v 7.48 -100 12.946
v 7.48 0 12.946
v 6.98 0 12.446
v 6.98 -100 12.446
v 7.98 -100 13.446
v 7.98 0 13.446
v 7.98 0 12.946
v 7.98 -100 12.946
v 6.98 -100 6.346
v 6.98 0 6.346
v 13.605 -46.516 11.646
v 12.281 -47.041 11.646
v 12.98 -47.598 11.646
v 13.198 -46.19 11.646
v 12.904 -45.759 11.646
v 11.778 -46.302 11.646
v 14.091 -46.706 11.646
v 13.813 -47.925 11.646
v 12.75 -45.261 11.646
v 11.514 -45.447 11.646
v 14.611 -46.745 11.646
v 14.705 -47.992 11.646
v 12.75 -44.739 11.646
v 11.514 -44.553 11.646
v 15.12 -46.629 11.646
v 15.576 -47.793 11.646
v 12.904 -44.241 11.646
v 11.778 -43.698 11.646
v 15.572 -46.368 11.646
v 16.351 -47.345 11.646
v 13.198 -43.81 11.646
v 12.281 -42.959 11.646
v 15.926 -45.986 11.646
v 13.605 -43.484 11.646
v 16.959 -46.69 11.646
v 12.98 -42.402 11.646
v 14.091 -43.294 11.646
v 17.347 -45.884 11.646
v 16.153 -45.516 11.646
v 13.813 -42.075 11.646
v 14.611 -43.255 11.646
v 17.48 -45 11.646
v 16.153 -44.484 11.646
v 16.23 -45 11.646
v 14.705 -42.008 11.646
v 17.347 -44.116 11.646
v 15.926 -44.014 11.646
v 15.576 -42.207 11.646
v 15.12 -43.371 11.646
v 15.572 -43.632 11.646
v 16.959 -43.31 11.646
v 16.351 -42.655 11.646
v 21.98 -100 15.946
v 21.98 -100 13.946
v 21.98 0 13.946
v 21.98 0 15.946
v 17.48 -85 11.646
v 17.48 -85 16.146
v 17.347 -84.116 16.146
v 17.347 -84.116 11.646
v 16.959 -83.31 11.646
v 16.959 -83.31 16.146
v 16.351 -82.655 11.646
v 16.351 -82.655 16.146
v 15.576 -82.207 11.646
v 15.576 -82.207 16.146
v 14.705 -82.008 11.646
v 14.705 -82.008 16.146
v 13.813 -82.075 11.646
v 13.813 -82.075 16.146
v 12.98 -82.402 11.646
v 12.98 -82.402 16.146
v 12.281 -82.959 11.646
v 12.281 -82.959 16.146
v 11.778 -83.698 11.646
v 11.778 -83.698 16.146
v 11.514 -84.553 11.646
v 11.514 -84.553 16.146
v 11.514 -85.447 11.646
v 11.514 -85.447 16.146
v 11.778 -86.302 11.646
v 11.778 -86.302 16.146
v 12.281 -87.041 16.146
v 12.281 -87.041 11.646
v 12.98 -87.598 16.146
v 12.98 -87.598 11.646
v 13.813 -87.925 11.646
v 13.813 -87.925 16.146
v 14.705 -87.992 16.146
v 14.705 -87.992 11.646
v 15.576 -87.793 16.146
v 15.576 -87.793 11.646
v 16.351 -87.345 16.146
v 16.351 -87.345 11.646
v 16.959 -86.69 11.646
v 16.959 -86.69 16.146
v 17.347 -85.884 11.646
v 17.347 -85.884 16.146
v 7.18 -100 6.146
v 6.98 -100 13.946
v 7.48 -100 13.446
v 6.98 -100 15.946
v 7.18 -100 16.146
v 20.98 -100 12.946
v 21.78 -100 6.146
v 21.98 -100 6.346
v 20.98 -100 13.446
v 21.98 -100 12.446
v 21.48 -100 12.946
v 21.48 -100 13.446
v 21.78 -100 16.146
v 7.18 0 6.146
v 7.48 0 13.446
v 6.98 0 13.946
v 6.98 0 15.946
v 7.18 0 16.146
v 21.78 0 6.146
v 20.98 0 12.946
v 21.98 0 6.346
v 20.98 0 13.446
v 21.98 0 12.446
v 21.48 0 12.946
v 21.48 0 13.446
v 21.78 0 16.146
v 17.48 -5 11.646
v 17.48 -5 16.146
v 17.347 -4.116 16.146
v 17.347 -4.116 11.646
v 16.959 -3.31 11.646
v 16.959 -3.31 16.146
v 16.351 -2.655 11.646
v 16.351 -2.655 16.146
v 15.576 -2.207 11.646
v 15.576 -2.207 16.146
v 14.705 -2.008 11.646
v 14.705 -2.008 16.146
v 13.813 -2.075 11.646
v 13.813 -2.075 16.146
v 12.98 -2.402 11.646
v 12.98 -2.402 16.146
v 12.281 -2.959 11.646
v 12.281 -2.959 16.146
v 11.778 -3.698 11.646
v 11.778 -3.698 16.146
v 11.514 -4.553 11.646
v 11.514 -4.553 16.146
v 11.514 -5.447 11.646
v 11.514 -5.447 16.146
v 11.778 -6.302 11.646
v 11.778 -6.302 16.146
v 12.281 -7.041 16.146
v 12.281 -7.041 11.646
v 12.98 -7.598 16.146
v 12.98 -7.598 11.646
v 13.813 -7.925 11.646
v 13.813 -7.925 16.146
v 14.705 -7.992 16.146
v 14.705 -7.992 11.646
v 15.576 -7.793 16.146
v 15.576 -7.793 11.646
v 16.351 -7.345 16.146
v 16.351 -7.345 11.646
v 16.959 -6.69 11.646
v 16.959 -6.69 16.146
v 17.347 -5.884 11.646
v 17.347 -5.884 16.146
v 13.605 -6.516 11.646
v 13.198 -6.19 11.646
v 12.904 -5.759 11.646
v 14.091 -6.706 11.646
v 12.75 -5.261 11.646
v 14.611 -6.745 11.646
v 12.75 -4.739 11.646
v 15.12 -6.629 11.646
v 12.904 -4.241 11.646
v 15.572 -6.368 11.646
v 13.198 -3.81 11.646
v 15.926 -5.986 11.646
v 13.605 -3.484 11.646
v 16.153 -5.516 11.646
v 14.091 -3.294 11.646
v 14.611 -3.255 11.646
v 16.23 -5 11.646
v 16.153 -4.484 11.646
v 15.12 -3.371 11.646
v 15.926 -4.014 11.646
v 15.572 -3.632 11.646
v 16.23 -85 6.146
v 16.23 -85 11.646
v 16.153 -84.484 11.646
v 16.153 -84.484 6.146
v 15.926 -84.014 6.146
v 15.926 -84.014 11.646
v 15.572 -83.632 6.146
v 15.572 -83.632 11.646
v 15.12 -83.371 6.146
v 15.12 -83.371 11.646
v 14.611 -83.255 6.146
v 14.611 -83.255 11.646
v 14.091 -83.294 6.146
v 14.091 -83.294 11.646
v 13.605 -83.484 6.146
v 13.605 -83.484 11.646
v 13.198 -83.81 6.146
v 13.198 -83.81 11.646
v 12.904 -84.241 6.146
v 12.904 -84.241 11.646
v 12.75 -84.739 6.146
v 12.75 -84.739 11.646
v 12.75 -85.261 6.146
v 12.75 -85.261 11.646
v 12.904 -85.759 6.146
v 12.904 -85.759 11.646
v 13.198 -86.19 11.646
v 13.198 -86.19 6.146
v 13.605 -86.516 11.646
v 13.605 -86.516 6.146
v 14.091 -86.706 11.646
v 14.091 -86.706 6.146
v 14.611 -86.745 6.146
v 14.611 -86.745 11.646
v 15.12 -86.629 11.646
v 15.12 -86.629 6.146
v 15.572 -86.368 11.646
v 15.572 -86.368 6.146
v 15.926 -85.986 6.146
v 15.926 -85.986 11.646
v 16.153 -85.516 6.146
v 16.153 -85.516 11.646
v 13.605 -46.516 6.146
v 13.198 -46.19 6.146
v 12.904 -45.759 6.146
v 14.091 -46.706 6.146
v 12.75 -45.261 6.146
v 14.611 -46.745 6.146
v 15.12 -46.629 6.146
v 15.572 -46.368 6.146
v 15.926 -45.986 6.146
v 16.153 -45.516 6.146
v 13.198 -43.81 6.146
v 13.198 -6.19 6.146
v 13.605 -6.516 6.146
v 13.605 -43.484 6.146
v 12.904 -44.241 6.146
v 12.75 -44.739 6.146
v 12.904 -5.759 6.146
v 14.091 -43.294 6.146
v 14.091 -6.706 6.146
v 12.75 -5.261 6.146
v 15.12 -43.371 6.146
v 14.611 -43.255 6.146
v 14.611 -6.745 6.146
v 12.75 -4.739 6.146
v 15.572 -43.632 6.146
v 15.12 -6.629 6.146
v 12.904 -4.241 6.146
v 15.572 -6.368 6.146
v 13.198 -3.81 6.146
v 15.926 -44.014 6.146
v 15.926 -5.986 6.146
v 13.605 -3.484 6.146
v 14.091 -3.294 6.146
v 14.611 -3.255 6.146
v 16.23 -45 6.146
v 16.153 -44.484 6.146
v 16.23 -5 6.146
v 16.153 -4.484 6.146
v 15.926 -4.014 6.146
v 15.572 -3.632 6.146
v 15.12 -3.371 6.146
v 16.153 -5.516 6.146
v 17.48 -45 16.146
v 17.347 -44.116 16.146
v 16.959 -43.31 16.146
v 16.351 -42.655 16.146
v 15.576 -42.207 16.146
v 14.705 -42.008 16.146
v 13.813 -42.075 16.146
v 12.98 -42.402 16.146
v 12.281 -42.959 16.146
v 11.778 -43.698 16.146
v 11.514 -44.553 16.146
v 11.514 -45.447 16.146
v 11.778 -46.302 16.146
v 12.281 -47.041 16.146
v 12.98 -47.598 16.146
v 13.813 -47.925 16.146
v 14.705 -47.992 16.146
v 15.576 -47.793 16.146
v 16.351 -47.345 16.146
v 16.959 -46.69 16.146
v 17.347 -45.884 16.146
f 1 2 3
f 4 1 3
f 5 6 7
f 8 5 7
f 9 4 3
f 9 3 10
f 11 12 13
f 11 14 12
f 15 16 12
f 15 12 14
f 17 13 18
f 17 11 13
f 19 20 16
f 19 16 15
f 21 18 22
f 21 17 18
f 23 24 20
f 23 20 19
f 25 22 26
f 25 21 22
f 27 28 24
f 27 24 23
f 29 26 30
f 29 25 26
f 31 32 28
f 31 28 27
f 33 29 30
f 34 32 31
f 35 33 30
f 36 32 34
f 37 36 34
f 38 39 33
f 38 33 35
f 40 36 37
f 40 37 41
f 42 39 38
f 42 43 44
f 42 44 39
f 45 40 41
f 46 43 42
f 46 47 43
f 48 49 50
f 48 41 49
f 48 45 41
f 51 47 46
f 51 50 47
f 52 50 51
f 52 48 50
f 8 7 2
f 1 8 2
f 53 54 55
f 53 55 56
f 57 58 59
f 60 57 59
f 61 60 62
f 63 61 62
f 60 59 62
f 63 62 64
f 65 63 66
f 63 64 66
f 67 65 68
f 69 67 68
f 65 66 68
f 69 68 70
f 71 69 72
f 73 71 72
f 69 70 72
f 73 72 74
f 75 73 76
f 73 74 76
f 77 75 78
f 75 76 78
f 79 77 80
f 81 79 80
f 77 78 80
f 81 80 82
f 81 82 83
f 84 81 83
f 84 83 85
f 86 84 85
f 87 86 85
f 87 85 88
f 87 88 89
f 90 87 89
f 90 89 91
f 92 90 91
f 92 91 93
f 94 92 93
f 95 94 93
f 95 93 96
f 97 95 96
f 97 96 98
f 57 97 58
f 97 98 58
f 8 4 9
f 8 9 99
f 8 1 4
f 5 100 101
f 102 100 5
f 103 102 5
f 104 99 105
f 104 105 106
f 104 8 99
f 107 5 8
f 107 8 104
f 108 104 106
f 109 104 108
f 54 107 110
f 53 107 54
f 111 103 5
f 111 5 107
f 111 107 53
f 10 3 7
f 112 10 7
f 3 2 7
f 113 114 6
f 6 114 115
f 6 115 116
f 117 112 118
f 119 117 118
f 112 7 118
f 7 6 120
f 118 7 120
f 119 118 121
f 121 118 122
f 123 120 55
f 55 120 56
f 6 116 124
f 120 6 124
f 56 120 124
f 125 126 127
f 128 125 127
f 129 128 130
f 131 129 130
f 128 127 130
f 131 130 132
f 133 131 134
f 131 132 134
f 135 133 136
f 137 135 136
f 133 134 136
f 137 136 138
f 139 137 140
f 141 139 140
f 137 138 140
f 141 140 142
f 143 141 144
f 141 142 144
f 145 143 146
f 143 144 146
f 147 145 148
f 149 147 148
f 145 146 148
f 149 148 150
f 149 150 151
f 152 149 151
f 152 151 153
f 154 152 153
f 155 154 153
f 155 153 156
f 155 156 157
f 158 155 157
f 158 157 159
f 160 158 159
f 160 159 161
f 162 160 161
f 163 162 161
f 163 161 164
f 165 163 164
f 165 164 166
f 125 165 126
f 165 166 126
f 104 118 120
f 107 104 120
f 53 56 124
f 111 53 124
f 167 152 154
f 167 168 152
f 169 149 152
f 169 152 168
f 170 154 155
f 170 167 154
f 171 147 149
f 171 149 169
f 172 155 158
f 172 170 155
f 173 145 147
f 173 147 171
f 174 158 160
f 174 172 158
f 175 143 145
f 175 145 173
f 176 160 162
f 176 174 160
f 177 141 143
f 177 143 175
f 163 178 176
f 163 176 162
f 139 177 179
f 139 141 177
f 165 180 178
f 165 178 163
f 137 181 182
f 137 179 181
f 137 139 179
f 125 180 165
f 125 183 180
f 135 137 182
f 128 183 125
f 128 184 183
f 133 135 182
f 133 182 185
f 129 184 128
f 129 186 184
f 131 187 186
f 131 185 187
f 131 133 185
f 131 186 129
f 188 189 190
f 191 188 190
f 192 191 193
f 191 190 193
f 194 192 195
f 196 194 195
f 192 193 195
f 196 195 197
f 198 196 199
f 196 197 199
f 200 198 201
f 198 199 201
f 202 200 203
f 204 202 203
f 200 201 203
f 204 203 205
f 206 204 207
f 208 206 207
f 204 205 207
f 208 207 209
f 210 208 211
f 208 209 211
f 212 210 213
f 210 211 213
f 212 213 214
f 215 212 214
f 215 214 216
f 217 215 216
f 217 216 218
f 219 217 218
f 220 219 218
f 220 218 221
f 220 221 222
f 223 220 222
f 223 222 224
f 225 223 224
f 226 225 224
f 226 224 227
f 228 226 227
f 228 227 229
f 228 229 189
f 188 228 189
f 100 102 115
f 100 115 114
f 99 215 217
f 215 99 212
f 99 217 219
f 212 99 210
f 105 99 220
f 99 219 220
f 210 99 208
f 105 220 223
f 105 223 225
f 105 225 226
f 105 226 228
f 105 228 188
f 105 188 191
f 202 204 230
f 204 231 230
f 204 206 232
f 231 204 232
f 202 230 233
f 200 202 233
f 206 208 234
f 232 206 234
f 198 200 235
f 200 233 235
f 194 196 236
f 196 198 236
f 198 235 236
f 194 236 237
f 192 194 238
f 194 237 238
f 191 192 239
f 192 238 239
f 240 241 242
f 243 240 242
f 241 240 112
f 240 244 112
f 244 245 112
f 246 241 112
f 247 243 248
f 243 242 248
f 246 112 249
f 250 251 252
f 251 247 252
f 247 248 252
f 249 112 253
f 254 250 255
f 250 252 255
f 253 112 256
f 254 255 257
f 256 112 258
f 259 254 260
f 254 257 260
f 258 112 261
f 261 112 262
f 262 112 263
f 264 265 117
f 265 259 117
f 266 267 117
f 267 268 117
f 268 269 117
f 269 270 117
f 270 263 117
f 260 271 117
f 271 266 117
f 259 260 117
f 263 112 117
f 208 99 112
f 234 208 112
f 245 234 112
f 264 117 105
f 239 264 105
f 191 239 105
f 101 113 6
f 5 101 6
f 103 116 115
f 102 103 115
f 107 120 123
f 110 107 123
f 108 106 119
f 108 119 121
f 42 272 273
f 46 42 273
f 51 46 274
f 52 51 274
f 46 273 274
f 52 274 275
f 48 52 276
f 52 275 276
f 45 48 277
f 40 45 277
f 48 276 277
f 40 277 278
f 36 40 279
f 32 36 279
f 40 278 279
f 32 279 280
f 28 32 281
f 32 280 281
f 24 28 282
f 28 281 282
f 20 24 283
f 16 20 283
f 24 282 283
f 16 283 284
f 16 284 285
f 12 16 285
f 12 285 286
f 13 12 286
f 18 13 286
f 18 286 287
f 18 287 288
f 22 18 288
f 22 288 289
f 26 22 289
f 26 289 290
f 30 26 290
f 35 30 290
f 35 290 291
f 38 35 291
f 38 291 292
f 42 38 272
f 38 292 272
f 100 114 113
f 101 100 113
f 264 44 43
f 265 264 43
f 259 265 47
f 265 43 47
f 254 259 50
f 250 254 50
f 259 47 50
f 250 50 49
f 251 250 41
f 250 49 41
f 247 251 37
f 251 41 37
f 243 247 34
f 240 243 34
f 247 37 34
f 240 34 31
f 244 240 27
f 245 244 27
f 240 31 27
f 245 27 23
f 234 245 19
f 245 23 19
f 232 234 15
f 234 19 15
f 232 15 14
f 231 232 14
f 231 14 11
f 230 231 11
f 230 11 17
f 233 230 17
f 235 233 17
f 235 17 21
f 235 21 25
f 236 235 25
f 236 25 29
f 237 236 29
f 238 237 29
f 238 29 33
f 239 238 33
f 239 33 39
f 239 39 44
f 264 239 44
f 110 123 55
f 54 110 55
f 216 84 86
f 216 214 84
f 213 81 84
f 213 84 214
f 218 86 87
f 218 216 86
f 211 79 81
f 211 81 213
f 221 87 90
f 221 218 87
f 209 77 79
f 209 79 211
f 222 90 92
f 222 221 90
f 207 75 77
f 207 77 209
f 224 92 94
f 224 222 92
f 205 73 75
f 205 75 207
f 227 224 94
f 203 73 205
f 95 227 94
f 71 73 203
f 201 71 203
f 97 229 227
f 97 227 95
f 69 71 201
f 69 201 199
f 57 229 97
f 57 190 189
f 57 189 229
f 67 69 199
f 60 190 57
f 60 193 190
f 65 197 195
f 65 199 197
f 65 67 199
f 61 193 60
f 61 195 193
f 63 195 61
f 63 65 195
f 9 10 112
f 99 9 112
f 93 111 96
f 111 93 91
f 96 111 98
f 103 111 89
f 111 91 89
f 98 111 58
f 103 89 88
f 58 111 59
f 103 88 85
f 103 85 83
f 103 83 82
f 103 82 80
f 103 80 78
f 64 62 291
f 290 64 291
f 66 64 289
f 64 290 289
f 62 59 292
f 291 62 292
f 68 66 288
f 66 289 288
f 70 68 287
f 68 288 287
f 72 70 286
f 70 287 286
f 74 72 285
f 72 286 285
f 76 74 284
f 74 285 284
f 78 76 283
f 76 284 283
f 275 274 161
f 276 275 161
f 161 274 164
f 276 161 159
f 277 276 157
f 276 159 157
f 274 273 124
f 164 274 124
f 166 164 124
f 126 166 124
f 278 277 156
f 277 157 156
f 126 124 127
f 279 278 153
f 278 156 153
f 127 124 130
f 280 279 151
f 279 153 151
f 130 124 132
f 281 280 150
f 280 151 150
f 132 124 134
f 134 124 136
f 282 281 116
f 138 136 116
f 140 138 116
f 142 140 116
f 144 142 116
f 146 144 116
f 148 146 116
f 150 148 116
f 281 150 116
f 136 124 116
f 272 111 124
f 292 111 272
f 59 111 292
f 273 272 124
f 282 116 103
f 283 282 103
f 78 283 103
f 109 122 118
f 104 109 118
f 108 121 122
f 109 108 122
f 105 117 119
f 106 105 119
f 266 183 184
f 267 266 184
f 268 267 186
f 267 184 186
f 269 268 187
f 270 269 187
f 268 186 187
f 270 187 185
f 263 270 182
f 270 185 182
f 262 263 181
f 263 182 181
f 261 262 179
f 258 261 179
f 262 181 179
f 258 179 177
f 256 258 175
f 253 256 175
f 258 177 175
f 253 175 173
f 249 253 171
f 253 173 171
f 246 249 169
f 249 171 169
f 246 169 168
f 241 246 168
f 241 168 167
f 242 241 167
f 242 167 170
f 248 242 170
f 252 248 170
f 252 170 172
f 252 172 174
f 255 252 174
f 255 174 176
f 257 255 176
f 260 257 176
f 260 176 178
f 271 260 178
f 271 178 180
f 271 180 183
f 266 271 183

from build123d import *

# Parameters (mm, degrees)
F1_DEPTH = 100
F2_R     = 1.75
F3_DEPTH = 10.001
F2_R_2   = 3
F4_DEPTH = 4.5


with BuildPart() as f1:
    # F0 (on Front) → F1 (new body)
    with BuildSketch(Plane.XZ):
        Polygon((6.980425, 12.446069), (6.980425, 6.346069), (7.180425, 6.146069), (21.780425, 6.146069), (21.980425, 6.346069), (21.980425, 12.446069), (21.480425, 12.946069), (20.980425, 12.946069), (20.980425, 13.446069), (21.480425, 13.446069), (21.980425, 13.946069), (21.980425, 15.946069), (21.780425, 16.146069), (7.180425, 16.146069), (6.980425, 15.946069), (6.980425, 13.946069), (7.480425, 13.446069), (7.980425, 13.446069), (7.980425, 12.946069), (7.480425, 12.946069), align=None)
    extrude(amount=F1_DEPTH)

    # F2 (on face) → F3 (cut, through all)
    with BuildSketch(Plane.XY.offset(16.146069)):
        with Locations((14.480425, -85)):
            Circle(F2_R)
        with Locations((14.480425, -45)):
            Circle(F2_R)
        with Locations((14.480425, -5)):
            Circle(F2_R)
    extrude(amount=-F3_DEPTH, mode=Mode.SUBTRACT)

    # F2 (on face) → F4 (cut)
    with BuildSketch(Plane.XY.offset(16.146069)):
        with Locations((14.480425, -85)):
            Circle(F2_R_2)
        with Locations((14.480425, -85)):
            Circle(F2_R, mode=Mode.SUBTRACT)
        with Locations((14.480425, -45)):
            Circle(F2_R_2)
        with Locations((14.480425, -45)):
            Circle(F2_R, mode=Mode.SUBTRACT)
        with Locations((14.480425, -5)):
            Circle(F2_R_2)
        with Locations((14.480425, -5)):
            Circle(F2_R, mode=Mode.SUBTRACT)
    extrude(amount=-F4_DEPTH, mode=Mode.SUBTRACT)


solid = f1.part
